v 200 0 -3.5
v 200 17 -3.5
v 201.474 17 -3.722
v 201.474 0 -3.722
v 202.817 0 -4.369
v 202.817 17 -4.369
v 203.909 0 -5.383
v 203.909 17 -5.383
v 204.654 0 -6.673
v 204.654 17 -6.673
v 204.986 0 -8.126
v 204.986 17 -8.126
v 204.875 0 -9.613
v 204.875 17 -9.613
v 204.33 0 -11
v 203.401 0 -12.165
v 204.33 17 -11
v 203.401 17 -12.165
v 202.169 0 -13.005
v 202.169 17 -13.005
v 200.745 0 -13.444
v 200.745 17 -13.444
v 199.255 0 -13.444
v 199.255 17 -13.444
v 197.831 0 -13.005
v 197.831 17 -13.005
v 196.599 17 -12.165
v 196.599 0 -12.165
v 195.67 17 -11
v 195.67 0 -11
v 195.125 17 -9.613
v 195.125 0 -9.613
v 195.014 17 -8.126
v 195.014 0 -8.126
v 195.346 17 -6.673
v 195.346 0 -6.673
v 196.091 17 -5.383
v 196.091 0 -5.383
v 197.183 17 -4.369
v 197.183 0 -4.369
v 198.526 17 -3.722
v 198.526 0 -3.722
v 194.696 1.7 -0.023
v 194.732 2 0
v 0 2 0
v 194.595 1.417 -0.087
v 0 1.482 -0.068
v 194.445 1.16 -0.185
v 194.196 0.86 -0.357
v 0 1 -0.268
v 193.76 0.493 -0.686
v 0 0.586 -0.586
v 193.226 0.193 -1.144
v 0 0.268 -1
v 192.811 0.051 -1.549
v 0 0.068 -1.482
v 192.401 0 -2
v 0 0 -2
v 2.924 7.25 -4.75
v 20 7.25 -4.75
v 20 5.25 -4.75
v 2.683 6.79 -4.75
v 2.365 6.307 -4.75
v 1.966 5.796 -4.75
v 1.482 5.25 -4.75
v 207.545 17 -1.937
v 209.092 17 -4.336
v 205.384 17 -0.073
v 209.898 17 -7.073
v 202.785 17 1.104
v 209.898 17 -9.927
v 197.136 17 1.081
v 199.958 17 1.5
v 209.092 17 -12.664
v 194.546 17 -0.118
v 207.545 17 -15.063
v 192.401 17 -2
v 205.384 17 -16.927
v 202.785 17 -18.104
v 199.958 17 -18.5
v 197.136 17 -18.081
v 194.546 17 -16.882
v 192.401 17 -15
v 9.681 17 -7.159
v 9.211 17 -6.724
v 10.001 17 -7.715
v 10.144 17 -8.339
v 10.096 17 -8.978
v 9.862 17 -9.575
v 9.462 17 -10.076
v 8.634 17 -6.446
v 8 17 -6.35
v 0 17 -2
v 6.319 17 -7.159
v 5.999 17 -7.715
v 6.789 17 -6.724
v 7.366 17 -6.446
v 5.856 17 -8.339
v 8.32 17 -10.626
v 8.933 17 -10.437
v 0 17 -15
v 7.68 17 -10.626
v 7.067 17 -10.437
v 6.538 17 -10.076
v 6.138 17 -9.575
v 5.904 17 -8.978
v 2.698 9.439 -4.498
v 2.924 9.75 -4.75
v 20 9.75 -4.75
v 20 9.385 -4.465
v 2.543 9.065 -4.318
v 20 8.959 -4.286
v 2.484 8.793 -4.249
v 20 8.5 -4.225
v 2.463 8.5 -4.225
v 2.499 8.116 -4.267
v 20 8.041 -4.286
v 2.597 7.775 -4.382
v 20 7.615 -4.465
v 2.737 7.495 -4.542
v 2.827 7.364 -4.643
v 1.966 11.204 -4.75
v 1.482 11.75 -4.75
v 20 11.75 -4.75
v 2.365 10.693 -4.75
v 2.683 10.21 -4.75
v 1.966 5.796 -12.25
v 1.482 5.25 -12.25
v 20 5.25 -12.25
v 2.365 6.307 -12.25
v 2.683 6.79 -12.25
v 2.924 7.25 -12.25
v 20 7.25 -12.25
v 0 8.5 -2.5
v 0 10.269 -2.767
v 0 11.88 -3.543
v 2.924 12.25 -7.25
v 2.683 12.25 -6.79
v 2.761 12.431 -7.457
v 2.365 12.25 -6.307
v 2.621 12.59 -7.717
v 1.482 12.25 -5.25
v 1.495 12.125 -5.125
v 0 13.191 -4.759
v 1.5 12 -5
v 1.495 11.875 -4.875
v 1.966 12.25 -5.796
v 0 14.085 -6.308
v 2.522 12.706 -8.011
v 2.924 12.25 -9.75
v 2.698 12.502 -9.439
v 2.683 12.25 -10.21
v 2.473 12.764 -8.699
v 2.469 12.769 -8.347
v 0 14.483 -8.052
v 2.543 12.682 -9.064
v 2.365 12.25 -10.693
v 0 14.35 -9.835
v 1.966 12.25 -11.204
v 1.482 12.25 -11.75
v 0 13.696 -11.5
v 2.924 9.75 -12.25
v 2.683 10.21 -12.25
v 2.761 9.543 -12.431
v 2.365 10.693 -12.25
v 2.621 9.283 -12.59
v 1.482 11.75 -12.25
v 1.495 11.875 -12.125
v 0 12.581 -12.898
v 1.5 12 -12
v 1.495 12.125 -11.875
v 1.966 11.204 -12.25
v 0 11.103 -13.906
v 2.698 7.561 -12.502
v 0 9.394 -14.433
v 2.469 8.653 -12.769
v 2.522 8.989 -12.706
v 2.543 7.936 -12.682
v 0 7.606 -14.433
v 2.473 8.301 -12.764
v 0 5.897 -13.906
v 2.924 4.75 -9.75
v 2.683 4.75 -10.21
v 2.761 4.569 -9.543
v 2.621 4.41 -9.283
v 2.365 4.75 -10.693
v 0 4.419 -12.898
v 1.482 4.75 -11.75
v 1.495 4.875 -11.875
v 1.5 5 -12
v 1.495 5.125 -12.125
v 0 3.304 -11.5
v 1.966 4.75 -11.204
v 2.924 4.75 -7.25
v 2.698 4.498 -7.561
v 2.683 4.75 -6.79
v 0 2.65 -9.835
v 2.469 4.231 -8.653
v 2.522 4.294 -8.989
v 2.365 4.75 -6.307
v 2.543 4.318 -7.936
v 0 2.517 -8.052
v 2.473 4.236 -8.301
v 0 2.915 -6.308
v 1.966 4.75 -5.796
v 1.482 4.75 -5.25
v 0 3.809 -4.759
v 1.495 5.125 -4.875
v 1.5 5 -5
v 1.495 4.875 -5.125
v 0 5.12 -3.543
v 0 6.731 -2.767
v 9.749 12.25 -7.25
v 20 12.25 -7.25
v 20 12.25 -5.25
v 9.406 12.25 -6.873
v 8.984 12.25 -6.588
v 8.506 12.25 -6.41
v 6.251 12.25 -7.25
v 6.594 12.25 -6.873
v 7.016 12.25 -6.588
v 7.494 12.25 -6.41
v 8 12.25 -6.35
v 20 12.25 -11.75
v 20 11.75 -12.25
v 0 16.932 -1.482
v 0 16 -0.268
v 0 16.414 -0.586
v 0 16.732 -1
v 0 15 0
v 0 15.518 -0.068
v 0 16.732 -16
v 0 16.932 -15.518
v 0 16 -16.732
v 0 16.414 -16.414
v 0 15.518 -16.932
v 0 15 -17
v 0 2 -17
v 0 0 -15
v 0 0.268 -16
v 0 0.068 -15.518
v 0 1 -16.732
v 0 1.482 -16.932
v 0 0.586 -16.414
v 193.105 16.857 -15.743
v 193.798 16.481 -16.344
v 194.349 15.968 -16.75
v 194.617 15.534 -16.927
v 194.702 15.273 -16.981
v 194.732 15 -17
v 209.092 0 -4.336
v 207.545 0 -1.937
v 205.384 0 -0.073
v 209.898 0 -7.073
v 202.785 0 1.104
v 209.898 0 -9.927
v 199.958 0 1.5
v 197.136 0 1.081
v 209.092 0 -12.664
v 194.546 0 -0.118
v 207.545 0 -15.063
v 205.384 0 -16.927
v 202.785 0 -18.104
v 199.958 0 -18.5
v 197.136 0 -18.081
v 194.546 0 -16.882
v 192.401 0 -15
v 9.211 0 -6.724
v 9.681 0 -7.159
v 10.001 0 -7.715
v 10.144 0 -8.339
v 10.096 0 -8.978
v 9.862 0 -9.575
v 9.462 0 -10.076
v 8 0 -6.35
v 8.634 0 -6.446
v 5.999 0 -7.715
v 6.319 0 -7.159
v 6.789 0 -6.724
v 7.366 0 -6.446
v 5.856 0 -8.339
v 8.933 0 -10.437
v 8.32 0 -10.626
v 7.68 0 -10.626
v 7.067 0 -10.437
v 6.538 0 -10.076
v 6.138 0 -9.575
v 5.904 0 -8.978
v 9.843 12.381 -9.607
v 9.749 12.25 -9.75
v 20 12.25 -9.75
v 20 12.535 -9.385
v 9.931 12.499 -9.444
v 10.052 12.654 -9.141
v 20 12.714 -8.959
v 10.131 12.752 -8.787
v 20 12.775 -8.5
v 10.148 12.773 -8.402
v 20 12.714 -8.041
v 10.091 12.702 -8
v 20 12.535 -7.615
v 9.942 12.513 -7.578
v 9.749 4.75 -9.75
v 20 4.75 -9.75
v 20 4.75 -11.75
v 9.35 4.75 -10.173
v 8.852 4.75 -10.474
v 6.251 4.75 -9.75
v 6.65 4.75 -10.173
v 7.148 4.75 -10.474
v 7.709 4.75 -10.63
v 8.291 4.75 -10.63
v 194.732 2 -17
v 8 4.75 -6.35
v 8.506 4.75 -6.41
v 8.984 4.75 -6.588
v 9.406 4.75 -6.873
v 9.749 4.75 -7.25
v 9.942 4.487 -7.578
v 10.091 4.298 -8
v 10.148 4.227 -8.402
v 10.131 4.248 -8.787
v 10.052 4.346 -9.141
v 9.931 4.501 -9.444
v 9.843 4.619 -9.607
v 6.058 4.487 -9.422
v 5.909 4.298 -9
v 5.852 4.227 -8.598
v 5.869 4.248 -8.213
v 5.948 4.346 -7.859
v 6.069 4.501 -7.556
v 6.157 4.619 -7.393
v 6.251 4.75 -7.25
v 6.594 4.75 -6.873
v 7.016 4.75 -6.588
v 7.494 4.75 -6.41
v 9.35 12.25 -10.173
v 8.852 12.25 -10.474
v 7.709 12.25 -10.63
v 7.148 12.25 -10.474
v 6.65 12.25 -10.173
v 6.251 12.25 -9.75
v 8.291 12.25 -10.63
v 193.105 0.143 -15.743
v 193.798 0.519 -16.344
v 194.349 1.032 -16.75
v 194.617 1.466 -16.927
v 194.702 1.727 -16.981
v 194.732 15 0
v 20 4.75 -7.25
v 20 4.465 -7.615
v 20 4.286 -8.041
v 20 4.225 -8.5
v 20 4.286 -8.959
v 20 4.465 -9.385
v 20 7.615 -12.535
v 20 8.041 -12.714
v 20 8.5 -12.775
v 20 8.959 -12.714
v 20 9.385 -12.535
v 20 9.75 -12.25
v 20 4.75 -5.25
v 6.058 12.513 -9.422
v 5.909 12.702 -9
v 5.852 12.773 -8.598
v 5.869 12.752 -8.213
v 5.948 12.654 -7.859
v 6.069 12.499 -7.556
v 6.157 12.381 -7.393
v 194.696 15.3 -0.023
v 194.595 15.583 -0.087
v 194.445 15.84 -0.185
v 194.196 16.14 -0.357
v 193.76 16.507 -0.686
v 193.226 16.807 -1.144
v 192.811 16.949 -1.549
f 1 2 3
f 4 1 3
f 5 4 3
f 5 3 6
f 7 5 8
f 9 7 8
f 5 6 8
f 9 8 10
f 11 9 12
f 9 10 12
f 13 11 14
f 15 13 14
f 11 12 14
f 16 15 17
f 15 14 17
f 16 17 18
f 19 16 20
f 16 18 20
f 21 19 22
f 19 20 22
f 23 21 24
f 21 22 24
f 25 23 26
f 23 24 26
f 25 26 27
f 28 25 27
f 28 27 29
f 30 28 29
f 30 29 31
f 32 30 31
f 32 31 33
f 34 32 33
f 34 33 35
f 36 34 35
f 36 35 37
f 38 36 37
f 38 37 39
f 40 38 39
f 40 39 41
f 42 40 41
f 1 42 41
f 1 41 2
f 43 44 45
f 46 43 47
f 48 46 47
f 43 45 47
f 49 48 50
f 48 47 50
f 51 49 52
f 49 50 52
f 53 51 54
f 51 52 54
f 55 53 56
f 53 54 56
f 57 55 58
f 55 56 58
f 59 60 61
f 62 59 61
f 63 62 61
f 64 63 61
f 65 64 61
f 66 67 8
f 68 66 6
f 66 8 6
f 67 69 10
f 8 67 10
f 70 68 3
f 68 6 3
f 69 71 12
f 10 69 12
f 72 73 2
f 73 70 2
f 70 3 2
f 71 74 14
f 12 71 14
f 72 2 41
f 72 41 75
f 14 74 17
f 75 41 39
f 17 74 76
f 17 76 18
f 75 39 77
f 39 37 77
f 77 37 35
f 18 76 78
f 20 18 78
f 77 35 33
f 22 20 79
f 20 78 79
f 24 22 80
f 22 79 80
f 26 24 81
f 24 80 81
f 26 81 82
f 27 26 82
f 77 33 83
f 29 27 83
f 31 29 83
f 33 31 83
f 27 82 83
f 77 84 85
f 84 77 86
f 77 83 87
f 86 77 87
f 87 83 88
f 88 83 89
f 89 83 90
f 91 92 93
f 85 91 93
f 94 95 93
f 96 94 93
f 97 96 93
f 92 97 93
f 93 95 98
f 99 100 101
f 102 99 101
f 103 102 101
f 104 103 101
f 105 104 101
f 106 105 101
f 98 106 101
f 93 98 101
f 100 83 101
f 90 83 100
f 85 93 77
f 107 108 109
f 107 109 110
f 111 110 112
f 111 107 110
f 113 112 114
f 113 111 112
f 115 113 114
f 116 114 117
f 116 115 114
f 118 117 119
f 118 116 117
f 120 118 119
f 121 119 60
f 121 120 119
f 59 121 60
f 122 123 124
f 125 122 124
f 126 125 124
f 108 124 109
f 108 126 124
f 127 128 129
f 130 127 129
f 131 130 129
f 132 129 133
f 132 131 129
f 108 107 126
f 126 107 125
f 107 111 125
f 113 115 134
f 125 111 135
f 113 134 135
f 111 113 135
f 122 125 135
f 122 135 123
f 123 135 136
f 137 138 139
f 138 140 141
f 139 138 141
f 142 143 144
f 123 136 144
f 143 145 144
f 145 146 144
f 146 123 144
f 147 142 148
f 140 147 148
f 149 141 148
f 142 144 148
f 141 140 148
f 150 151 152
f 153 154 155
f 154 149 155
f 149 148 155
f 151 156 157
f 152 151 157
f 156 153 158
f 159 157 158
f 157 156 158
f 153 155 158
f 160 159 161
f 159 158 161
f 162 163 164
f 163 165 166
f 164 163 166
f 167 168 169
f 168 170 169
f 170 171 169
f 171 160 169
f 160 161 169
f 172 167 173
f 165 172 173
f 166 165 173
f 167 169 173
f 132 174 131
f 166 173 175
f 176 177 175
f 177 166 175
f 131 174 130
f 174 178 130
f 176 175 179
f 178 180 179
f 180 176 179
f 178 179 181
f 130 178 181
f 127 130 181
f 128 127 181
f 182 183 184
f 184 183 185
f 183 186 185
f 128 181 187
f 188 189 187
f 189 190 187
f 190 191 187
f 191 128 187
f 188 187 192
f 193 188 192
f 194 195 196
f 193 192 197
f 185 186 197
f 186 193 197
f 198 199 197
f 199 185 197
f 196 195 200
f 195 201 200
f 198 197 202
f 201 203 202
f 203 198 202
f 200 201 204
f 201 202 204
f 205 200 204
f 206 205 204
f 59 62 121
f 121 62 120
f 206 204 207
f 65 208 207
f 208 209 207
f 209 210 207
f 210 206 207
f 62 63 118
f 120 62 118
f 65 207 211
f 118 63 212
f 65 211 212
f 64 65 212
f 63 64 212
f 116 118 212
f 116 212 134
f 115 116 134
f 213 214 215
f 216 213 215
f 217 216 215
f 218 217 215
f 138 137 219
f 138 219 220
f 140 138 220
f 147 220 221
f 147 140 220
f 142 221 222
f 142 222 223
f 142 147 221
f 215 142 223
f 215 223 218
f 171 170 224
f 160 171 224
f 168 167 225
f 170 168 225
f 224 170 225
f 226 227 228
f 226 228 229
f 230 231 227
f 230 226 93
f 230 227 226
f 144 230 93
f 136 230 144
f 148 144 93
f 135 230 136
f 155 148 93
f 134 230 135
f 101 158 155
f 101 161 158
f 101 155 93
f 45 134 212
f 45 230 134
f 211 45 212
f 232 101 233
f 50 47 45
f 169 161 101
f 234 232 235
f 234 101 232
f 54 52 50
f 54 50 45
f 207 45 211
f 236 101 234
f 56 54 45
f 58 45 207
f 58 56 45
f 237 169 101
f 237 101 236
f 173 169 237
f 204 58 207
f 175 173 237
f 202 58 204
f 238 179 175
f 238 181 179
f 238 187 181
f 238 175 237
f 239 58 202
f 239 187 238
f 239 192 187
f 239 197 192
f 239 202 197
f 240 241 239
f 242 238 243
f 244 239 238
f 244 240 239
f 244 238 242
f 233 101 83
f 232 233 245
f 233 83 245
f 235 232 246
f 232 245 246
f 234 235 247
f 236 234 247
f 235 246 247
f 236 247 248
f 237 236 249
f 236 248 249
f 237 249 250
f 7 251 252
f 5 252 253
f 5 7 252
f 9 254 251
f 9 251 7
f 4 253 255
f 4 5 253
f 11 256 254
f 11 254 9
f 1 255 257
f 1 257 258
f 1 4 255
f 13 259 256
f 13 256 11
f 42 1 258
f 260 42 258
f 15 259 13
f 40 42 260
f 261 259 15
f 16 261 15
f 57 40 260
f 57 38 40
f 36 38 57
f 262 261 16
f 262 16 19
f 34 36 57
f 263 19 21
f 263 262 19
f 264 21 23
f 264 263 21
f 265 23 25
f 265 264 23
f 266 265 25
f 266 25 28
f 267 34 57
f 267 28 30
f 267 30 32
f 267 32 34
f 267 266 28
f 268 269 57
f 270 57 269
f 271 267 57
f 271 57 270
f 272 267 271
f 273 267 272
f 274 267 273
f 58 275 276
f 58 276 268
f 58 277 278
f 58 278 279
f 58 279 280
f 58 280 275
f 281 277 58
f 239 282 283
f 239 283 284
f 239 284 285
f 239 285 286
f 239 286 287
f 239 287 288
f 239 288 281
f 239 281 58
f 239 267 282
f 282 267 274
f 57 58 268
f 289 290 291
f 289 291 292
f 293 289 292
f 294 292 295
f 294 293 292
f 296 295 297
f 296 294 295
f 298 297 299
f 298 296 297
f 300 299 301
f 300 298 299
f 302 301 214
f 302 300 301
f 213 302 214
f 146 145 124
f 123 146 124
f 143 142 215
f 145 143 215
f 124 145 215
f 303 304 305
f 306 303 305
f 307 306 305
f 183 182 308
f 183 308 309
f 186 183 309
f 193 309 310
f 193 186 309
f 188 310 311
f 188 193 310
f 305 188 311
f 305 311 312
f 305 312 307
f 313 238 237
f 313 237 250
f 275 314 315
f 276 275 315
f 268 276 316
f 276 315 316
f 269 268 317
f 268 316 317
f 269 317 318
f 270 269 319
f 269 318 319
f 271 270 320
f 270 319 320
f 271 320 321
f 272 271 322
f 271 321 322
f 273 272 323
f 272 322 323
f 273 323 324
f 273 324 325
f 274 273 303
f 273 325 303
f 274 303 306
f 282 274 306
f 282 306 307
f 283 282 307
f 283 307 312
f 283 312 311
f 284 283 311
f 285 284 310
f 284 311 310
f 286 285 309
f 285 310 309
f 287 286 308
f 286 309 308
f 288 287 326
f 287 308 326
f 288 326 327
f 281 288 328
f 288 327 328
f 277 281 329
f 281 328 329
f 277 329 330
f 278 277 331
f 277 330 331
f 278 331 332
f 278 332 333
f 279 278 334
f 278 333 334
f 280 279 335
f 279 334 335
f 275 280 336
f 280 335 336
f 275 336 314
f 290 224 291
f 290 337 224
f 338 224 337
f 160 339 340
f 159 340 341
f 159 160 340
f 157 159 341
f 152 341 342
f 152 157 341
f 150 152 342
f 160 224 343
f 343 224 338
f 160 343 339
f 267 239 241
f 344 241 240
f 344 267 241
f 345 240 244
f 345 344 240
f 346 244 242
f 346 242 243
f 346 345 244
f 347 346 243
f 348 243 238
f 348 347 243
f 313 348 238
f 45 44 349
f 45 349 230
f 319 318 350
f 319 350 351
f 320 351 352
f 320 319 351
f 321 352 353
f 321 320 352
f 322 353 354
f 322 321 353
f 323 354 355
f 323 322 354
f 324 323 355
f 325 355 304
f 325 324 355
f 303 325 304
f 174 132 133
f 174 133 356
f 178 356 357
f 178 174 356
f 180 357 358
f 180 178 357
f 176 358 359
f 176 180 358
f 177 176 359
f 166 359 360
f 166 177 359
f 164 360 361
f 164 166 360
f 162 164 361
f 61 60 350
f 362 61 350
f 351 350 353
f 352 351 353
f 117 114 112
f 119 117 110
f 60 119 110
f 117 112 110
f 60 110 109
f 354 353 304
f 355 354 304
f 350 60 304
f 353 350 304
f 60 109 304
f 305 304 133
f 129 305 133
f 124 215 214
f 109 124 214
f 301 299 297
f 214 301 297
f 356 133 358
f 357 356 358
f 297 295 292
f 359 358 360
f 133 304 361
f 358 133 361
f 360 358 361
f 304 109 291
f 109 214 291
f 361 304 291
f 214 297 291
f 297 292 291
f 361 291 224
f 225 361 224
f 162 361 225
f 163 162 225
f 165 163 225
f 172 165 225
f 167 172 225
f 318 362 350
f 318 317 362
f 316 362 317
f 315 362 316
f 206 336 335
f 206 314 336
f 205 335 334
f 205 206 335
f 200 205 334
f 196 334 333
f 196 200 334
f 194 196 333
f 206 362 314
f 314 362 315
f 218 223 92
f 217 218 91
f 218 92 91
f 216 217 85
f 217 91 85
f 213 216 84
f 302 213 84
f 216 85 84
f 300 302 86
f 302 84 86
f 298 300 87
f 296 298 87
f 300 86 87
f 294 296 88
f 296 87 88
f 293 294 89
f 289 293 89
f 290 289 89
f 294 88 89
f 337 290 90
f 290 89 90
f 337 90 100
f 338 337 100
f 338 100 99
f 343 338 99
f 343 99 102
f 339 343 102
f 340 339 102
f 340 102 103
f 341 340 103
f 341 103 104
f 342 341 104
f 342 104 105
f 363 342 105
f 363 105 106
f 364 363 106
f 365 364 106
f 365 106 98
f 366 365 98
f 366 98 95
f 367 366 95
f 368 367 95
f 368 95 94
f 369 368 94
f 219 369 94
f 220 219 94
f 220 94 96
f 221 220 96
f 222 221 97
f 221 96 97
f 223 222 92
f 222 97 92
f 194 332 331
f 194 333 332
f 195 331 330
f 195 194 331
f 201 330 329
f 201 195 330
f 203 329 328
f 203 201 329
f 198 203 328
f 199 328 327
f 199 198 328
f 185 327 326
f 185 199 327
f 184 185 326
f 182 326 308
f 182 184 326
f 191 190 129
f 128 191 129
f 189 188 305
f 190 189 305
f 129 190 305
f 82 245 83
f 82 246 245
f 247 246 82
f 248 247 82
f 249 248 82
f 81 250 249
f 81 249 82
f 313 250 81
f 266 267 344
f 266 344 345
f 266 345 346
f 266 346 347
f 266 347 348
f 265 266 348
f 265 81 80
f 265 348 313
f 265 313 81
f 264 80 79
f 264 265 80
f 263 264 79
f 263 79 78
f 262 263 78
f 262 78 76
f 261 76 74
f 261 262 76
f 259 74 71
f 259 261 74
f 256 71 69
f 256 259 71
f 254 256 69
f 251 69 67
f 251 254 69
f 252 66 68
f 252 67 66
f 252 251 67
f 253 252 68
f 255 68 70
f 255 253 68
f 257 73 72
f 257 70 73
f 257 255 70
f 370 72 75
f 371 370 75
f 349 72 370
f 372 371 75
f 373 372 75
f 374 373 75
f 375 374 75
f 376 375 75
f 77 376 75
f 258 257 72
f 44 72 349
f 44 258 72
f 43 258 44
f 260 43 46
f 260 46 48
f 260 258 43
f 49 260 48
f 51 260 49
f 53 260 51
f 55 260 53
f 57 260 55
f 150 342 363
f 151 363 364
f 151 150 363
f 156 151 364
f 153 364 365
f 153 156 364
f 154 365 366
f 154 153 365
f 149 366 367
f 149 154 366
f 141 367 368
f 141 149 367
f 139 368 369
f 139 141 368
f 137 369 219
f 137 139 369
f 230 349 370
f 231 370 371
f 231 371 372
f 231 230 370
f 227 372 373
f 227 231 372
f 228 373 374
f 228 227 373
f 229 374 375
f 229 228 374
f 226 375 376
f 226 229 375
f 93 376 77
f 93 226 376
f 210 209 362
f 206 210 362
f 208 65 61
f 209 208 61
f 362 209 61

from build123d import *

# Parameters (mm, degrees)
RESSALTO_EXTRUS_O1_DEPTH = 17
ESBO_O3_R                = 5
CORTE_EXTRUS_O2_DEPTH    = 212.497635921
CORTE_EXTRUS_O3_DEPTH    = 20
CHANFRO1_SIZE            = 0.5
ESBO_O5_R                = 6
CORTE_EXTRUS_O4_DEPTH    = 3.5
CORTE_EXTRUS_O4_DRAFT    = -35
FILETE1_R                = 2
ESBO_O6_R                = 2.15
CORTE_EXTRUS_O5_DEPTH    = 212.497636037


with BuildPart() as part:
    # Esboço1 → Ressalto-extrusão1 (new body)
    with BuildSketch(Plane(origin=(0, 0, 0), x_dir=(1, 0, 0), z_dir=(0, 1, 0))):
        with BuildLine():
            Line((0, 17), (194.732173124, 17))
            ThreePointArc((194.732173124, 17), (210, 8.5), (194.732173124, 0))
            Line((194.732173124, 0), (0, 0))
            Line((0, 0), (0, 17))
        make_face()
    extrude(amount=RESSALTO_EXTRUS_O1_DEPTH)

    # Esboço3 → Corte-extrusão2 (cut, through all)
    with BuildSketch(Plane(origin=(0, 17, 0), x_dir=(1, 0, 0), z_dir=(0, 1, 0))):
        with Locations((200, 8.5)):
            Circle(ESBO_O3_R)
    extrude(amount=-CORTE_EXTRUS_O2_DEPTH, mode=Mode.SUBTRACT)

    # Esboço4 → Corte-extrusão3 (cut)
    with BuildSketch(Plane.ZY):
        with BuildLine():
            Line((-7.25, 12.25), (-4.75, 12.25))
            Line((-4.75, 12.25), (-4.75, 9.75))
            ThreePointArc((-4.75, 9.75), (-4.224744871, 8.5), (-4.75, 7.25))
            Line((-4.75, 7.25), (-4.75, 4.75))
            Line((-4.75, 4.75), (-7.25, 4.75))
            ThreePointArc((-7.25, 4.75), (-8.5, 4.224744871), (-9.75, 4.75))
            Line((-9.75, 4.75), (-12.25, 4.75))
            Line((-12.25, 4.75), (-12.25, 7.25))
            ThreePointArc((-12.25, 7.25), (-12.775255129, 8.5), (-12.25, 9.75))
            Line((-12.25, 9.75), (-12.25, 12.25))
            Line((-12.25, 12.25), (-9.75, 12.25))
            ThreePointArc((-9.75, 12.25), (-8.5, 12.775255129), (-7.25, 12.25))
        make_face()
    extrude(amount=-CORTE_EXTRUS_O3_DEPTH, mode=Mode.SUBTRACT)

    # Chanfro1
    chanfro1_edges = [part.edges().sort_by_distance(p)[0] for p in [
        (10, 4.75, -12.25),
        (10, 12.25, -12.25),
        (10, 12.25, -4.75),
        (10, 4.75, -4.75),
    ]]
    chamfer(chanfro1_edges, length=CHANFRO1_SIZE)


with BuildPart() as corte_extrus_o4_tool:
    # Esboço5 → Corte-extrusão4 (with draft: the straight prism first)
    with BuildSketch(Plane.ZY):
        with Locations((-8.5, 8.5)):
            Circle(ESBO_O5_R)
    extrude(amount=-CORTE_EXTRUS_O4_DEPTH)
    # Corte-extrusão4: the draft: its side faces are tilted about the plane it starts from
    corte_extrus_o4_sides = [corte_extrus_o4_tool.faces().sort_by_distance(p)[0] for p in [
        (1.75, 8.5, -14.5),
    ]]
    draft(corte_extrus_o4_sides, Plane.ZY, CORTE_EXTRUS_O4_DRAFT)


with BuildPart() as part_1:
    add(part.part)

    # Corte-extrusão4: cut by corte_extrus_o4_tool
    add(corte_extrus_o4_tool.part, mode=Mode.SUBTRACT)

    # Filete1
    filete1_edges = [part_1.edges().sort_by_distance(p)[0] for p in [
        (97.366086562, 0, 0),
        (97.366086562, 17, 0),
        (97.366086562, 0, -17),
        (97.366086562, 17, -17),
    ]]
    fillet(filete1_edges, radius=FILETE1_R)

    # Esboço6 → Corte-extrusão5 (cut, through all)
    with BuildSketch(Plane(origin=(0, 17, 0), x_dir=(1, 0, 0), z_dir=(0, 1, 0))):
        with Locations((8, 8.5)):
            Circle(ESBO_O6_R)
    extrude(amount=-CORTE_EXTRUS_O5_DEPTH, mode=Mode.SUBTRACT)


solid = part_1.part
